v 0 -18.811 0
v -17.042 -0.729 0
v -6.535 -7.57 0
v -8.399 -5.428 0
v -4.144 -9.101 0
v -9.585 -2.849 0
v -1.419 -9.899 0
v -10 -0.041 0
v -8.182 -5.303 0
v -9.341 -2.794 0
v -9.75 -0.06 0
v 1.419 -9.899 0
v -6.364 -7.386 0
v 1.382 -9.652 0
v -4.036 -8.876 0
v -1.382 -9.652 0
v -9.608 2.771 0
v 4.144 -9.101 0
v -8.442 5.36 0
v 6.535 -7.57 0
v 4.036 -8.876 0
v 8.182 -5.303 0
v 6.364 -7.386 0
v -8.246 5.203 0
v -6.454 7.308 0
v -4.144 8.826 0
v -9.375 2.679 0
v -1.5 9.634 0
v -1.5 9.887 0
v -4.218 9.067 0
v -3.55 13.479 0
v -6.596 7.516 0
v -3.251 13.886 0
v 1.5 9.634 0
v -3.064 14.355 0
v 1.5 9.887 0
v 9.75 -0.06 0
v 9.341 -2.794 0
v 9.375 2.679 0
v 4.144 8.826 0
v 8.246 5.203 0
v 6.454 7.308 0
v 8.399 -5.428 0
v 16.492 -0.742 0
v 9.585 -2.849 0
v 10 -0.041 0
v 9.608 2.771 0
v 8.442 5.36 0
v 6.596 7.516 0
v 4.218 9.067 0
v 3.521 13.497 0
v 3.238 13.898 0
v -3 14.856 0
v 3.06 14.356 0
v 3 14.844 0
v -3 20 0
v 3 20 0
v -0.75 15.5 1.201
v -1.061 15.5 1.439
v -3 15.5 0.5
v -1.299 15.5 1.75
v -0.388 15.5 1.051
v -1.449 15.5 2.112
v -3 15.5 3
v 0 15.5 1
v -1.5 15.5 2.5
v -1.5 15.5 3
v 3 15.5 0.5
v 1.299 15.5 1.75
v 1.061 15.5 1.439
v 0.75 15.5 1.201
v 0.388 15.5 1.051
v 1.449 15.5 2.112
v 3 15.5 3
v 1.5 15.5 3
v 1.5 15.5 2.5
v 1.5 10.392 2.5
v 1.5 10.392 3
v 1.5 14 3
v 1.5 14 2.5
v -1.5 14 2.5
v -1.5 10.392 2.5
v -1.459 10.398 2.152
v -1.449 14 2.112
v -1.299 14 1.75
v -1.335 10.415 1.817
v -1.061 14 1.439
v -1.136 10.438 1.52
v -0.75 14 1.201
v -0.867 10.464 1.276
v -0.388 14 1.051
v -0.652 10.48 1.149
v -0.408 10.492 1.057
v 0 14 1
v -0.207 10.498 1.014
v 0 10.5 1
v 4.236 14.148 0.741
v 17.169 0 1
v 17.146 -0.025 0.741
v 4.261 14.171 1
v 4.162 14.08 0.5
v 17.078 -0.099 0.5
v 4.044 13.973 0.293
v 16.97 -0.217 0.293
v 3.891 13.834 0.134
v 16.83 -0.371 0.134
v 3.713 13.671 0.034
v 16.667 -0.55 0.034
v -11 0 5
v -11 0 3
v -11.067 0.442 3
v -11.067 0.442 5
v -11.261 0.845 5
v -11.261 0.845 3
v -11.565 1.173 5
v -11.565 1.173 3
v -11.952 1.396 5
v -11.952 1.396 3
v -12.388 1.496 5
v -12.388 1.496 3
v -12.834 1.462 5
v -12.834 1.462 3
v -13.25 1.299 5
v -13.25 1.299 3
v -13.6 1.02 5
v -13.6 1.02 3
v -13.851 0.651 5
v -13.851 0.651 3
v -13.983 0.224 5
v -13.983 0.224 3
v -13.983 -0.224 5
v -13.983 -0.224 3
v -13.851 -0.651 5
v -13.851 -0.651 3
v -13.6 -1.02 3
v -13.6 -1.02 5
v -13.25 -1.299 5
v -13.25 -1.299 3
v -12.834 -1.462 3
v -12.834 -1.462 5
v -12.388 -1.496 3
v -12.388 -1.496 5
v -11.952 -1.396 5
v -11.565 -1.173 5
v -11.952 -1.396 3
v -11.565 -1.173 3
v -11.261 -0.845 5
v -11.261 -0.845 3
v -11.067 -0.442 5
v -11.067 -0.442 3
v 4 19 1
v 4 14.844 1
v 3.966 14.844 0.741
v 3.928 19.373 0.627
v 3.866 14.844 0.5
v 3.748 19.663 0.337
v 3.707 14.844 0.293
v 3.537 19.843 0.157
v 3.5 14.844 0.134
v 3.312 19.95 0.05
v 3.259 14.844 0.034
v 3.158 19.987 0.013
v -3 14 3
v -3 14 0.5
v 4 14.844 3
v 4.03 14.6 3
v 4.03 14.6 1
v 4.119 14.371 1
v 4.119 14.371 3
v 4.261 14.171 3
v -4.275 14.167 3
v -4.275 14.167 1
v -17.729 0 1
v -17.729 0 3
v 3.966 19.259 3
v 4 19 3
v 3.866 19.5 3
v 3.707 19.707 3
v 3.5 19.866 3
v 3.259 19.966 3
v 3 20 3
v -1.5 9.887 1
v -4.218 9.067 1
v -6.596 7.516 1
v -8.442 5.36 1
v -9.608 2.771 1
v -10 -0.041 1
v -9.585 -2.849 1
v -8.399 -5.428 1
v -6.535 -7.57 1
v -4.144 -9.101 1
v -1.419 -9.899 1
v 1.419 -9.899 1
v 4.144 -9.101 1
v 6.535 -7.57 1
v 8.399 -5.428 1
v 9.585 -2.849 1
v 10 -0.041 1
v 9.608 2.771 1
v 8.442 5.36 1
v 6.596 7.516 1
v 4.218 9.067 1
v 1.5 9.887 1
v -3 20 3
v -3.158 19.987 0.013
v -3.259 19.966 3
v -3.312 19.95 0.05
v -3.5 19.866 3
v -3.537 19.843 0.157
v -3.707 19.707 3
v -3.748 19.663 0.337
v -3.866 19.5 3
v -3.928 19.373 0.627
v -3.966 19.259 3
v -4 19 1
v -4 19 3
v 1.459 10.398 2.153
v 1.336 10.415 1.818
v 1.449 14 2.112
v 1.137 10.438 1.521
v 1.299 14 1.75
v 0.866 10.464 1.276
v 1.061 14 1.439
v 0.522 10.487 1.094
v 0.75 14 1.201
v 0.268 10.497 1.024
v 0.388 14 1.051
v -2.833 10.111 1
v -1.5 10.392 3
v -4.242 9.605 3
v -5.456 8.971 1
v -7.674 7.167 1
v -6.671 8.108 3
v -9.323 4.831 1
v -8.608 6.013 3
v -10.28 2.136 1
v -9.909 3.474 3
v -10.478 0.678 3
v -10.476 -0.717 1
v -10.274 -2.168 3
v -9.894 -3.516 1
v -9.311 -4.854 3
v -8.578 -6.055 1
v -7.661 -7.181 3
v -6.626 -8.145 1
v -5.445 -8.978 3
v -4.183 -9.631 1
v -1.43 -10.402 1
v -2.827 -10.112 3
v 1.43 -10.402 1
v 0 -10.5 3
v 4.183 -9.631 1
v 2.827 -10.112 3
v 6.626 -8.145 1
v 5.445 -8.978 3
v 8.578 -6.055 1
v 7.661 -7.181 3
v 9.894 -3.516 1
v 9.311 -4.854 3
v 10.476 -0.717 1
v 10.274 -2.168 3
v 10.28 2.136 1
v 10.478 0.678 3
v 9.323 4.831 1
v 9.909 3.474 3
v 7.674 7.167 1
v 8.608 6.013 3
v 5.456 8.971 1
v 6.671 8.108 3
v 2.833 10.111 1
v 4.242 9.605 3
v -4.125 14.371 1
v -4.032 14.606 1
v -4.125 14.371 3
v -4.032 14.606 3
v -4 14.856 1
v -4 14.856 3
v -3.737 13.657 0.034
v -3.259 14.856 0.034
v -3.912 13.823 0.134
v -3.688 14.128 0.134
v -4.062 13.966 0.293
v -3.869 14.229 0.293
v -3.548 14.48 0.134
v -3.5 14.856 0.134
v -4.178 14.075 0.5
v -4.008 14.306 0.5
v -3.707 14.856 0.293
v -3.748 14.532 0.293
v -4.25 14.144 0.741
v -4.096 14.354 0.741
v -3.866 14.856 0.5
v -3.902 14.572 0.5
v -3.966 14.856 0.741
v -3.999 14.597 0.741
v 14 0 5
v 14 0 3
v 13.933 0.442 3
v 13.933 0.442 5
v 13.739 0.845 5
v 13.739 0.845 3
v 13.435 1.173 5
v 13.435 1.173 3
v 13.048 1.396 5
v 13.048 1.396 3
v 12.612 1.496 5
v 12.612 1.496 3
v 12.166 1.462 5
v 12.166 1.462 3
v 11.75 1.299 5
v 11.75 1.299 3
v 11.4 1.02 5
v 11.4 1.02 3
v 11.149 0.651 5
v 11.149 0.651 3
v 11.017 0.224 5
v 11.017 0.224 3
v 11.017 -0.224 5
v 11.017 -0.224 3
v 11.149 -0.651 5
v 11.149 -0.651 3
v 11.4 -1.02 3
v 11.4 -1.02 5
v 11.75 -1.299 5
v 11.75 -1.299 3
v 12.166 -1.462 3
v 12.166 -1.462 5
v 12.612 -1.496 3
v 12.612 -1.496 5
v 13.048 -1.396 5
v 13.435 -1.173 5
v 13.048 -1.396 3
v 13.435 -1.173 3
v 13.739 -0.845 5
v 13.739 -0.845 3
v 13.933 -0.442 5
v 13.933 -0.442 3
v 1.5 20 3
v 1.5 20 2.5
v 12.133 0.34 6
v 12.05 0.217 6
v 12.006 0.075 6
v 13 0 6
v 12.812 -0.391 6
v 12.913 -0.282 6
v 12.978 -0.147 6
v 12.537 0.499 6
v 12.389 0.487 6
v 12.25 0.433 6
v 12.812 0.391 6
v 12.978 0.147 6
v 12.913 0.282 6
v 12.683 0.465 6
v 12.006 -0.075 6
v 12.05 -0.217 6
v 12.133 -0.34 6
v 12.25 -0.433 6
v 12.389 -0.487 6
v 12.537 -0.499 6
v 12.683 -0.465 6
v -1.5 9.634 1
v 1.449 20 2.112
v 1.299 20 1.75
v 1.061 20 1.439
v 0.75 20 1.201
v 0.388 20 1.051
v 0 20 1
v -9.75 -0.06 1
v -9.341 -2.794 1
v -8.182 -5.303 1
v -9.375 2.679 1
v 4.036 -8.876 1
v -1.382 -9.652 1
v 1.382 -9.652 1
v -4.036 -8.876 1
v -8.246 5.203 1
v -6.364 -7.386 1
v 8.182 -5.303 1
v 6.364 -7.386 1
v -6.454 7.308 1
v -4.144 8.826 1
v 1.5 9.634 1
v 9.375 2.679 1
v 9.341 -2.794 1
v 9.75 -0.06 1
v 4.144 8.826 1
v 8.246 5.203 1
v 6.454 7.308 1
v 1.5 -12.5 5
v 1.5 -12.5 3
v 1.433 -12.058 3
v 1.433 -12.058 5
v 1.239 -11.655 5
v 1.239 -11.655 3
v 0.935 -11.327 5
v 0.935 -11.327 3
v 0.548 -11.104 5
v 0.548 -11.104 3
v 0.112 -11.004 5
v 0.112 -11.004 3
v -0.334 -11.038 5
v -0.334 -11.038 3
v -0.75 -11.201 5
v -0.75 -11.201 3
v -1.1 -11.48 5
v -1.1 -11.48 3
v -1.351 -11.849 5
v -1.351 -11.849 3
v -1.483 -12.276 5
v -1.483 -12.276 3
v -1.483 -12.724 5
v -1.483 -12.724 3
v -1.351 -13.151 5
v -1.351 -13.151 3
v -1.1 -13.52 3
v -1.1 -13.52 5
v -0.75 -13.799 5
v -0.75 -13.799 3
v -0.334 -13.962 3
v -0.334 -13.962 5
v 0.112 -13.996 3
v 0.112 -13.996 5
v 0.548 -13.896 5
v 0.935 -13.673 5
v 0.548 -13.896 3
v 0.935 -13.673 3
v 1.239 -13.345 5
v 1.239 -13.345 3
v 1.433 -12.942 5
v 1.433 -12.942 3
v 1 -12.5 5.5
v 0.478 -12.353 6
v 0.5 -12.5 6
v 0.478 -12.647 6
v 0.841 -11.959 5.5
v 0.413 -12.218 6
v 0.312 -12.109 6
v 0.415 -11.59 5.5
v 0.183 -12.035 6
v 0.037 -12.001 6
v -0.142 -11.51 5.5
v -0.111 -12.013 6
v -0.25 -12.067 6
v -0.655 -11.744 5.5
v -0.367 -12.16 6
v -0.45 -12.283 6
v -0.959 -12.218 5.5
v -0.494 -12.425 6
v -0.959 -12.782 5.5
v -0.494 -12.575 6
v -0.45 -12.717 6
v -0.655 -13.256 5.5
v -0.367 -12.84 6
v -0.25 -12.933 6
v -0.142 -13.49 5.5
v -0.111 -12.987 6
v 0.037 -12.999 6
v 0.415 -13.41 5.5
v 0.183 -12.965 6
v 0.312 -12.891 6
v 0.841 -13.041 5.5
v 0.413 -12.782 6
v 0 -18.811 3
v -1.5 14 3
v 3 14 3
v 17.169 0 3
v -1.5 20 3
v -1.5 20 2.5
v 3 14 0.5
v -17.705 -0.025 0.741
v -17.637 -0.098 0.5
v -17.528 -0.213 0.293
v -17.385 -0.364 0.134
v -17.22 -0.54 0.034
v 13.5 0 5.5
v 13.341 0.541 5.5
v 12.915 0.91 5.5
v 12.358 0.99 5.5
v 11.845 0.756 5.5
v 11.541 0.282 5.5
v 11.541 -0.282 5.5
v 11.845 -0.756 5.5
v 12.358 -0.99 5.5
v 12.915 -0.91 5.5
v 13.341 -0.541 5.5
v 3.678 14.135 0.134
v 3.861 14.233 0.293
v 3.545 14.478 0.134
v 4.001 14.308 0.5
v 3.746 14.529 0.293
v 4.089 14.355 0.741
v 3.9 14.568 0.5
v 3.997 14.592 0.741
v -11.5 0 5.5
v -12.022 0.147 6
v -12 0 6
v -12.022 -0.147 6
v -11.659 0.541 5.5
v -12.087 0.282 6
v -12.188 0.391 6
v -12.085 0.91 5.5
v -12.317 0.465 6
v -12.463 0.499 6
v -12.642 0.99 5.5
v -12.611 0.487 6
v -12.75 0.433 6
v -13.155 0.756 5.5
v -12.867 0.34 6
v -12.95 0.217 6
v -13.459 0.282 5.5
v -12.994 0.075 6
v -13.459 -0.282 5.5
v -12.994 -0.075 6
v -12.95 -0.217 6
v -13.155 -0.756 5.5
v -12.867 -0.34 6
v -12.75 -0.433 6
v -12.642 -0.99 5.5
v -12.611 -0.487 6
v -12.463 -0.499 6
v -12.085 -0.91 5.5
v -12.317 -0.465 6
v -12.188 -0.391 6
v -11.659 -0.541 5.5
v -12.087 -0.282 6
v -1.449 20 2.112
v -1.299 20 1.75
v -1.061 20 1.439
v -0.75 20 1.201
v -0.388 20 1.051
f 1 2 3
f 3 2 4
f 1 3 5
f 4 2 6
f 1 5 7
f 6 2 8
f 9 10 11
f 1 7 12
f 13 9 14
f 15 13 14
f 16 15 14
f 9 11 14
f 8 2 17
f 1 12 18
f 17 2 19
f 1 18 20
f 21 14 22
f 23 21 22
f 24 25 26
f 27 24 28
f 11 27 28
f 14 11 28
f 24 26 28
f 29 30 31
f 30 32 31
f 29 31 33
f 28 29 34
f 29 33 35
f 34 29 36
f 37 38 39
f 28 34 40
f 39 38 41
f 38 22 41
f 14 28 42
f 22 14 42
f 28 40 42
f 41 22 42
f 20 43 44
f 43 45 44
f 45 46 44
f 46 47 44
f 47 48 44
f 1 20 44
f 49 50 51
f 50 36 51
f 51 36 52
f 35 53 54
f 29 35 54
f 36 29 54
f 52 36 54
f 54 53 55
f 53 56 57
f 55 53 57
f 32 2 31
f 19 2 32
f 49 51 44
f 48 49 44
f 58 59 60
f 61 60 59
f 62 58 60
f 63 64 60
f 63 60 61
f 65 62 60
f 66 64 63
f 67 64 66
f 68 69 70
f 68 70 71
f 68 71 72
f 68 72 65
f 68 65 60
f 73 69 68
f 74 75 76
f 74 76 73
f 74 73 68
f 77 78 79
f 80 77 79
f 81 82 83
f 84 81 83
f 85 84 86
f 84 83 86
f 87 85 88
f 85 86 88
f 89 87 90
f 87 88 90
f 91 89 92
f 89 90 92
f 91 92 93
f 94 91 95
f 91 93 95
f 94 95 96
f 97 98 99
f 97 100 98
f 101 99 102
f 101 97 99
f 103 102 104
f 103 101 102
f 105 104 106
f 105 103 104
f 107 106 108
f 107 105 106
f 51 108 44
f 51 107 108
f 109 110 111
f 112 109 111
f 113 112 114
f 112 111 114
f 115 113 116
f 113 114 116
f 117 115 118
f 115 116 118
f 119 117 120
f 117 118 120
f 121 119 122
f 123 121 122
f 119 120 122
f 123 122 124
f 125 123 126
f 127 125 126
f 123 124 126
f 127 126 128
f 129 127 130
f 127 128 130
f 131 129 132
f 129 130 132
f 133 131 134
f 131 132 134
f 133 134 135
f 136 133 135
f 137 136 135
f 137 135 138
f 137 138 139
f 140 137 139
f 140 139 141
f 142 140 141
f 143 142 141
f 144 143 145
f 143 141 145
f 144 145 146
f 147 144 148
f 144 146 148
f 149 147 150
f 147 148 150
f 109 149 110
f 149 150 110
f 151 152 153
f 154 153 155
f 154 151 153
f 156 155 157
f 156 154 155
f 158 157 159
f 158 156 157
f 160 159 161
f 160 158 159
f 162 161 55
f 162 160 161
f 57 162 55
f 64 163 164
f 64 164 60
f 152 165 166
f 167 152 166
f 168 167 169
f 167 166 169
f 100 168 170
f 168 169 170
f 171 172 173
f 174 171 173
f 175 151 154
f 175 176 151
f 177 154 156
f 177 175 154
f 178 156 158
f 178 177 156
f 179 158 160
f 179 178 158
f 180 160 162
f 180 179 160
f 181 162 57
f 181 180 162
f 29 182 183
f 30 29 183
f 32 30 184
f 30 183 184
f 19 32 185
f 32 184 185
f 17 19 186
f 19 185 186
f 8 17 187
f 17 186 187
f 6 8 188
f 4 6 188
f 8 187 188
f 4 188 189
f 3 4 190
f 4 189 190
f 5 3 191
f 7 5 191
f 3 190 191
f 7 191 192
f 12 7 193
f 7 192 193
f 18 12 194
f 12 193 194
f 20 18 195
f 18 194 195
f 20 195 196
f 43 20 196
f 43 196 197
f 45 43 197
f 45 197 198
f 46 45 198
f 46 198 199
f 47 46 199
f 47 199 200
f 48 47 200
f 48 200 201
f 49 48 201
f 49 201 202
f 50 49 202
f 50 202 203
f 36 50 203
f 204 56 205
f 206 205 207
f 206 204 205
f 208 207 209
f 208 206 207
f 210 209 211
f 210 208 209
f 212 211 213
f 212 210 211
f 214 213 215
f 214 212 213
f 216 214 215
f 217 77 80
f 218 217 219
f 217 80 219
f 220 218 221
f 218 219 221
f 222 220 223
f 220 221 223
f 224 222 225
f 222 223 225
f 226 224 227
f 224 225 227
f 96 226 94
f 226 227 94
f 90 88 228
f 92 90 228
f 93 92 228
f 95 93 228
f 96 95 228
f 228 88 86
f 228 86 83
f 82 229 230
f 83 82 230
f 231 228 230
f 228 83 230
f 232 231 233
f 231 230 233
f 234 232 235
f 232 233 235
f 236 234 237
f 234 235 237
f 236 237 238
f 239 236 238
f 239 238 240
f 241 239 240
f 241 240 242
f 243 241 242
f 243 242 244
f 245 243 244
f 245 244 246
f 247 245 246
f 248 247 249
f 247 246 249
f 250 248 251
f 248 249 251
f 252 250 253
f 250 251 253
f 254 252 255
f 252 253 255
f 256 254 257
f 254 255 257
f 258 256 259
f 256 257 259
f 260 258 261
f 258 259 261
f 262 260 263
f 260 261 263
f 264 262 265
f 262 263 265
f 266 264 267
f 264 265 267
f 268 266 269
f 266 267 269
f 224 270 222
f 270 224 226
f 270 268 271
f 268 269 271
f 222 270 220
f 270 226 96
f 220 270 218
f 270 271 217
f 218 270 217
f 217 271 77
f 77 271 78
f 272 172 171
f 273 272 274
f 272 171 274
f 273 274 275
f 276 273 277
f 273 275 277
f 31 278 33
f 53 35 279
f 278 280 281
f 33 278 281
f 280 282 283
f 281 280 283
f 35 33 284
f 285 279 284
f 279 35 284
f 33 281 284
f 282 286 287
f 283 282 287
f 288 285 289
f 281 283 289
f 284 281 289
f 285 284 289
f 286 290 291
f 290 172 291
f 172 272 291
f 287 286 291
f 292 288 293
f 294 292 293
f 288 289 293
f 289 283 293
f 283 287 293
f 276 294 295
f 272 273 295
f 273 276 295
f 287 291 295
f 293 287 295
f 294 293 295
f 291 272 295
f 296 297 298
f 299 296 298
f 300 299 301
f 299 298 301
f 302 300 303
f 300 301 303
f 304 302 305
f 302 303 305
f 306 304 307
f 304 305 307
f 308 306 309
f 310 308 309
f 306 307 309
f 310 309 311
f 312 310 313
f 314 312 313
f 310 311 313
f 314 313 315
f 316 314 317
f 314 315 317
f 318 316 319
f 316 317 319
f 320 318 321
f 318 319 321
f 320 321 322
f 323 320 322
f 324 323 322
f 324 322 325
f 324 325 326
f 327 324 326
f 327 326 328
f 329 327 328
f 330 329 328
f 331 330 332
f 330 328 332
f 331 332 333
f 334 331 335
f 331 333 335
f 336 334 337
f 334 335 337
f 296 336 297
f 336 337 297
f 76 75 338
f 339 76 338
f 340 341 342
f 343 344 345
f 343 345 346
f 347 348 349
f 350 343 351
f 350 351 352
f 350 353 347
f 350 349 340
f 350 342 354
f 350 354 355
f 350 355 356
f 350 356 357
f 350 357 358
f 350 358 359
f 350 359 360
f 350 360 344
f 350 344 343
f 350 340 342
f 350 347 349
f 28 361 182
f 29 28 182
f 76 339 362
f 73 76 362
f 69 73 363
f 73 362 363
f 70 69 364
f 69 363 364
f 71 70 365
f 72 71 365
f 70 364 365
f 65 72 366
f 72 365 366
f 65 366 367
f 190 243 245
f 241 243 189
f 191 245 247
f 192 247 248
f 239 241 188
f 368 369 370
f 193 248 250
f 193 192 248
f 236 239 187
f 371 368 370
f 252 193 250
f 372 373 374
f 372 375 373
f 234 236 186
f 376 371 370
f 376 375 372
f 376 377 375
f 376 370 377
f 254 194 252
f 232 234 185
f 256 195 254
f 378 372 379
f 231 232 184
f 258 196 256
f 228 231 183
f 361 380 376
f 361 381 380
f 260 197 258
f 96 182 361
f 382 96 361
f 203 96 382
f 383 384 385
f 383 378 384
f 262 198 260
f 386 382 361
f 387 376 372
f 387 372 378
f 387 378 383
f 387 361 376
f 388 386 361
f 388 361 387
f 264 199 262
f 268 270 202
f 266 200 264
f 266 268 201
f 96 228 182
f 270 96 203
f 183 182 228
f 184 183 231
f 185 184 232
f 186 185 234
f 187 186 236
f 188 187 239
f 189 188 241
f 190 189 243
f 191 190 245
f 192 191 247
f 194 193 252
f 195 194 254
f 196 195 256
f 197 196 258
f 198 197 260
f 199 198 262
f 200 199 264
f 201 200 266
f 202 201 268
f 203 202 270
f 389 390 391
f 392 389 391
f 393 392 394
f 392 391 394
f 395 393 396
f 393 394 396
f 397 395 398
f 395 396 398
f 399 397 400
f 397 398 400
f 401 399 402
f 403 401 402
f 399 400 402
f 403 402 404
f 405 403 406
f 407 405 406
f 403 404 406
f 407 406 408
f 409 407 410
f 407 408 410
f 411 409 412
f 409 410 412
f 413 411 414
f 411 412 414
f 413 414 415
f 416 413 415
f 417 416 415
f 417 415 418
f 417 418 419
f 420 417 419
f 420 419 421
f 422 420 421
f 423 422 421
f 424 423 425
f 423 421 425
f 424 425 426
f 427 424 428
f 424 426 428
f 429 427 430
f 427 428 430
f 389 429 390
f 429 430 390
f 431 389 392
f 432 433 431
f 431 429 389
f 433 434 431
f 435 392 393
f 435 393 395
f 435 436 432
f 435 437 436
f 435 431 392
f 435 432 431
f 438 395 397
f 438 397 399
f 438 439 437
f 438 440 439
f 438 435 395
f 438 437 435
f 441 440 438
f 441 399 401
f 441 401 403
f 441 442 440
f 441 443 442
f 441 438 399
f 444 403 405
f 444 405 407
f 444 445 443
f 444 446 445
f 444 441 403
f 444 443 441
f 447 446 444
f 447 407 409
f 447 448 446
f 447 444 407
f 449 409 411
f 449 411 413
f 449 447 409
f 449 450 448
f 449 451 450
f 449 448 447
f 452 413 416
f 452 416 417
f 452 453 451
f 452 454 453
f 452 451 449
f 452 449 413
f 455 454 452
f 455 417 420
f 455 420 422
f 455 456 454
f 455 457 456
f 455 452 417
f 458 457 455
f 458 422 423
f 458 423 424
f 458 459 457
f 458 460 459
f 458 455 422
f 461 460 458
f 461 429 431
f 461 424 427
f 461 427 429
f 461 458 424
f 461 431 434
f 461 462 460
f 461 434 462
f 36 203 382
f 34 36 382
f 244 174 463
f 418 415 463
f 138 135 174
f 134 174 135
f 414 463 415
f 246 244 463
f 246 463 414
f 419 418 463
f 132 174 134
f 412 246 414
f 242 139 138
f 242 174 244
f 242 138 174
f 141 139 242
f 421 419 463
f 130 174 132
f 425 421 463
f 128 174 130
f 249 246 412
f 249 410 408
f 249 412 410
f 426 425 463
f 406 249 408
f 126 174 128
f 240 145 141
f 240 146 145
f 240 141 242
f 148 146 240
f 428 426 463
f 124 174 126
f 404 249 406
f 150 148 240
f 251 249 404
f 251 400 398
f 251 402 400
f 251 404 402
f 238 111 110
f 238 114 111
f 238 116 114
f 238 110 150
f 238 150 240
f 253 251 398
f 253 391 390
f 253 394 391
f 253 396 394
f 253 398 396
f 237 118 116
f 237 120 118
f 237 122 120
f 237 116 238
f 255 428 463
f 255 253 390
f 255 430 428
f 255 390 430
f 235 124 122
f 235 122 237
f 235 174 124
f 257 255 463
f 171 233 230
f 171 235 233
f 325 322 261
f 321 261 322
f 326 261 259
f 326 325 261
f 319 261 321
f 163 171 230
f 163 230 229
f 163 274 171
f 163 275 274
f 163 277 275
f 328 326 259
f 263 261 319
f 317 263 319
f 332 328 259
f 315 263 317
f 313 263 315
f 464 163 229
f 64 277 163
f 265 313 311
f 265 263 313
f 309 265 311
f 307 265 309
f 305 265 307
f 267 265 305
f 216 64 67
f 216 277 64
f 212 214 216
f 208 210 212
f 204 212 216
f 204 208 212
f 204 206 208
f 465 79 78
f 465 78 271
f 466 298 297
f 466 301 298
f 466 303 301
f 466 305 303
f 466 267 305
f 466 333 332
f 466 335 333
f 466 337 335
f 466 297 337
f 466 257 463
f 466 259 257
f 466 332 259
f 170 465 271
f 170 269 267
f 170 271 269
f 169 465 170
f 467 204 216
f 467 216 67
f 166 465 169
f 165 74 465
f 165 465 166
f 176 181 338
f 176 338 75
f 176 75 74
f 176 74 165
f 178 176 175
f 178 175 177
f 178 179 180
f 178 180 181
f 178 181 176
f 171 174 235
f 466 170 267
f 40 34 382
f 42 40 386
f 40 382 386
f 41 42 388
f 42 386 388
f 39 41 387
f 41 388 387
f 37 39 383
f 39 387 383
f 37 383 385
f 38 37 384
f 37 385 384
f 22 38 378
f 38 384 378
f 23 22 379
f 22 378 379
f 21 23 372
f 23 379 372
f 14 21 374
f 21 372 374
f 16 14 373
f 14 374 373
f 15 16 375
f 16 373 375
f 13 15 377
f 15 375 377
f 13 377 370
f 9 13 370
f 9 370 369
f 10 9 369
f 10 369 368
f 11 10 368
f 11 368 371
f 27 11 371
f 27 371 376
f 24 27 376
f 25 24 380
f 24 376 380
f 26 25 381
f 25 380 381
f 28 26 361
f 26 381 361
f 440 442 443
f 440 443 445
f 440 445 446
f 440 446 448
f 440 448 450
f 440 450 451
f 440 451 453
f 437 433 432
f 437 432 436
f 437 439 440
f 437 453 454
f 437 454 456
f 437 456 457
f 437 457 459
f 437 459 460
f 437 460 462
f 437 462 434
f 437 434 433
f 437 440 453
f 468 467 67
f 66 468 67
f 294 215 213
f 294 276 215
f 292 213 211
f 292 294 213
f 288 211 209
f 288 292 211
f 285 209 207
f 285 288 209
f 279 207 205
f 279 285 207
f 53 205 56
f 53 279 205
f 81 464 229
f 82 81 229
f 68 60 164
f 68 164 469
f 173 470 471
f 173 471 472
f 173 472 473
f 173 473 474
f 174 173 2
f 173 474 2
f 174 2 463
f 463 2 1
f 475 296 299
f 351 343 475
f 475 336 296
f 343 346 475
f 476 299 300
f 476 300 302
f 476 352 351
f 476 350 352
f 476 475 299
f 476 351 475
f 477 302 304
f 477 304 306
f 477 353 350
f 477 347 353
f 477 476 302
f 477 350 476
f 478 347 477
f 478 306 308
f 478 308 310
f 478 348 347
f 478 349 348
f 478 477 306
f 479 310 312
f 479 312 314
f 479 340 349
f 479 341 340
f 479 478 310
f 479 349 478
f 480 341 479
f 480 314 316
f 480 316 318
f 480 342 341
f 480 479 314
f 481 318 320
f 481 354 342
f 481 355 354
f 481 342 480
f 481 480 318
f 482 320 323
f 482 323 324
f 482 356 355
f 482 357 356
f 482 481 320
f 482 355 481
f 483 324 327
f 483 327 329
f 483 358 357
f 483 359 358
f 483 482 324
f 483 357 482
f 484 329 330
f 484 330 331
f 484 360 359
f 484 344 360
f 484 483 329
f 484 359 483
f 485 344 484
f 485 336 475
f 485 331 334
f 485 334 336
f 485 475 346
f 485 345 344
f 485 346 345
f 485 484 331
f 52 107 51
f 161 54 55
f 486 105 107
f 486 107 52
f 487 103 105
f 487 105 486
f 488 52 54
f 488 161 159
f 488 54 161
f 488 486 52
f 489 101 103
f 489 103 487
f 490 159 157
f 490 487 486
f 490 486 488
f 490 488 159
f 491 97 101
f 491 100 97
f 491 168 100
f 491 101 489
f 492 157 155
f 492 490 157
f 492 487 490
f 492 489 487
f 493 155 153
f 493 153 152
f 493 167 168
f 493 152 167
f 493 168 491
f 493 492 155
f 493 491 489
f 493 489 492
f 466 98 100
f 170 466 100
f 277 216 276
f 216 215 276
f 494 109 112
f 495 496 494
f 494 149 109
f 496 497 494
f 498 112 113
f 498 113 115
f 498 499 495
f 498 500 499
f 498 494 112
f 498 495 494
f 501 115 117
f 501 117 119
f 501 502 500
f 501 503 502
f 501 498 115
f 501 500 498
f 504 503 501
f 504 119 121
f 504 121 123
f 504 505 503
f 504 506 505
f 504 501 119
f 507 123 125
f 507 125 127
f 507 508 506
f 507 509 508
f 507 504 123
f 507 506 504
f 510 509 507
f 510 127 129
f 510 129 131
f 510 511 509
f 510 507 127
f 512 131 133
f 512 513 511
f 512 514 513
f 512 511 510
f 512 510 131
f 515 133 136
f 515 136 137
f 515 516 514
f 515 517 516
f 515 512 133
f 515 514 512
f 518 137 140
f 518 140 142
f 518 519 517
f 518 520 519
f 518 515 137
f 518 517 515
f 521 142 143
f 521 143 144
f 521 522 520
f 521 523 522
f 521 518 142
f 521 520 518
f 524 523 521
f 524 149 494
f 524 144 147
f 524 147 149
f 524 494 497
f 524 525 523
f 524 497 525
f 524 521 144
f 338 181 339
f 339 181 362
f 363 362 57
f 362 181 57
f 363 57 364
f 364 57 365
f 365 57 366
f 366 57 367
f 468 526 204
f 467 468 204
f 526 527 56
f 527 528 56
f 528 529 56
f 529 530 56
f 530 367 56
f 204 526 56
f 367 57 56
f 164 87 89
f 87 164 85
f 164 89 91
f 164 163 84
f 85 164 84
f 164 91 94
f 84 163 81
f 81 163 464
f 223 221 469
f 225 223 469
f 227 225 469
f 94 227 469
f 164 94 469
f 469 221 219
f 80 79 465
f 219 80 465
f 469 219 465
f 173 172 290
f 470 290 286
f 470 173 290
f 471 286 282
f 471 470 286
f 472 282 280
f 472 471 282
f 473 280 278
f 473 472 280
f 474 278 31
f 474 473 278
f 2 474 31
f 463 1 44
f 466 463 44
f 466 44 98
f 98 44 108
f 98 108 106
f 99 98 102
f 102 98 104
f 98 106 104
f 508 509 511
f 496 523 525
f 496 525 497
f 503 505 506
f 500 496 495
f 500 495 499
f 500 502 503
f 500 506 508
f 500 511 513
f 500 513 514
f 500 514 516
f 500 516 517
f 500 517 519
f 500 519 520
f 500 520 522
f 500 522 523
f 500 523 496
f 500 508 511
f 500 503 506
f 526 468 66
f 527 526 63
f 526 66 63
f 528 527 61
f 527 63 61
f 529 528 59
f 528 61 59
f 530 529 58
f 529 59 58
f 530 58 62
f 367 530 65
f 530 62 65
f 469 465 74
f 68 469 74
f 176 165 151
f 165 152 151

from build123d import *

# Parameters (mm, degrees)
F1_DEPTH  = 3
F3_DEPTH  = 2
F4_R      = 1.5
F5_DEPTH  = 3
F6_SIZE   = 1
F7_R      = 1
F9_DEPTH  = 1.0010001
F10_R     = 1.49999
F11_W     = 6
F11_H     = 1.5
F12_DEPTH = 2.5


# Not quite as in the source:
# - a fillet or chamfer is up to 0.001 mm smaller than in the source, because OpenCascade refuses the exact size


with BuildPart() as f1:
    # F0 (on Top) → F1 (new body)
    with BuildSketch(Plane.XY):
        Polygon((4, 20), (-4, 20), (-4, 14.4568322948), (-17.7288018167, 0), (0, -18.8113879412), (17.1686839312, 0), (4, 14.4568322948), align=None)
    extrude(amount=F1_DEPTH)

    # F2 (on face) → F3 (cut)
    with BuildSketch(Plane.XY.offset(3)):
        with BuildLine():
            Line((1.5, 20), (-1.5, 20))
            Line((-1.5, 20), (-1.5, 10.3923048454))
            ThreePointArc((-1.5, 10.3923048454), (0, -10.5), (1.5, 10.3923048454))
            Line((1.5, 10.3923048454), (1.5, 20))
        make_face()
    extrude(amount=-F3_DEPTH, mode=Mode.SUBTRACT)

    # F4 (on face) → F5 (join)
    with BuildSketch(Plane.XY.offset(3)):
        with Locations((12.5, 0)):
            Circle(F4_R)
        with Locations((-12.5, 0)):
            Circle(F4_R)
        with Locations((0, -12.5)):
            Circle(F4_R)
    extrude(amount=F5_DEPTH)

    # F6
    f6_edges = [f1.edges().sort_by_distance(p)[0] for p in [
        (-14, 0, 6),
        (-1.5, -12.5, 6),
        (11, 0, 6),
    ]]
    chamfer(f6_edges, length=F6_SIZE)

    # F7
    f7_edges = [f1.edges().sort_by_distance(p)[0] for p in [
        (4, 17.228416, 0),
        (-4, 17.228416, 0),
        (-4, 14.456832, 1.5),
        (-10.864401, 7.228416, 0),
        (-4, 20, 1.5),
        (4, 14.456832, 1.5),
        (10.584342, 7.228416, 0),
        (4, 20, 1.5),
    ]]
    fillet(f7_edges, radius=F7_R)

    # F8 (on face) → F9 (cut, through all)
    with BuildSketch(Plane.XY.offset(1)):
        with BuildLine():
            Line((-1.5, 9.633924434), (-1.5, 9.8868599666))
            ThreePointArc((-1.5, 9.8868599666), (0, -10), (1.5, 9.8868599666))
            Line((1.5, 9.8868599666), (1.5, 9.633924434))
            ThreePointArc((1.5, 9.633924434), (0, -9.75), (-1.5, 9.633924434))
        make_face()
    extrude(amount=-F9_DEPTH, mode=Mode.SUBTRACT)

    # F10 (radius 1.5 in the source; OpenCascade refuses exactly that, so slightly less here)
    f10_edges = [f1.edges().sort_by_distance(p)[0] for p in [
        (1.5, 15.196152, 1),
        (-1.5, 15.196152, 1),
    ]]
    fillet(f10_edges, radius=F10_R)

    # F11 (on face) → F12 (cut)
    with BuildSketch(Plane.XY.offset(3)):
        with Locations((0, 14.75)):
            Rectangle(F11_W, F11_H)
    extrude(amount=-F12_DEPTH, mode=Mode.SUBTRACT)


solid = f1.part
